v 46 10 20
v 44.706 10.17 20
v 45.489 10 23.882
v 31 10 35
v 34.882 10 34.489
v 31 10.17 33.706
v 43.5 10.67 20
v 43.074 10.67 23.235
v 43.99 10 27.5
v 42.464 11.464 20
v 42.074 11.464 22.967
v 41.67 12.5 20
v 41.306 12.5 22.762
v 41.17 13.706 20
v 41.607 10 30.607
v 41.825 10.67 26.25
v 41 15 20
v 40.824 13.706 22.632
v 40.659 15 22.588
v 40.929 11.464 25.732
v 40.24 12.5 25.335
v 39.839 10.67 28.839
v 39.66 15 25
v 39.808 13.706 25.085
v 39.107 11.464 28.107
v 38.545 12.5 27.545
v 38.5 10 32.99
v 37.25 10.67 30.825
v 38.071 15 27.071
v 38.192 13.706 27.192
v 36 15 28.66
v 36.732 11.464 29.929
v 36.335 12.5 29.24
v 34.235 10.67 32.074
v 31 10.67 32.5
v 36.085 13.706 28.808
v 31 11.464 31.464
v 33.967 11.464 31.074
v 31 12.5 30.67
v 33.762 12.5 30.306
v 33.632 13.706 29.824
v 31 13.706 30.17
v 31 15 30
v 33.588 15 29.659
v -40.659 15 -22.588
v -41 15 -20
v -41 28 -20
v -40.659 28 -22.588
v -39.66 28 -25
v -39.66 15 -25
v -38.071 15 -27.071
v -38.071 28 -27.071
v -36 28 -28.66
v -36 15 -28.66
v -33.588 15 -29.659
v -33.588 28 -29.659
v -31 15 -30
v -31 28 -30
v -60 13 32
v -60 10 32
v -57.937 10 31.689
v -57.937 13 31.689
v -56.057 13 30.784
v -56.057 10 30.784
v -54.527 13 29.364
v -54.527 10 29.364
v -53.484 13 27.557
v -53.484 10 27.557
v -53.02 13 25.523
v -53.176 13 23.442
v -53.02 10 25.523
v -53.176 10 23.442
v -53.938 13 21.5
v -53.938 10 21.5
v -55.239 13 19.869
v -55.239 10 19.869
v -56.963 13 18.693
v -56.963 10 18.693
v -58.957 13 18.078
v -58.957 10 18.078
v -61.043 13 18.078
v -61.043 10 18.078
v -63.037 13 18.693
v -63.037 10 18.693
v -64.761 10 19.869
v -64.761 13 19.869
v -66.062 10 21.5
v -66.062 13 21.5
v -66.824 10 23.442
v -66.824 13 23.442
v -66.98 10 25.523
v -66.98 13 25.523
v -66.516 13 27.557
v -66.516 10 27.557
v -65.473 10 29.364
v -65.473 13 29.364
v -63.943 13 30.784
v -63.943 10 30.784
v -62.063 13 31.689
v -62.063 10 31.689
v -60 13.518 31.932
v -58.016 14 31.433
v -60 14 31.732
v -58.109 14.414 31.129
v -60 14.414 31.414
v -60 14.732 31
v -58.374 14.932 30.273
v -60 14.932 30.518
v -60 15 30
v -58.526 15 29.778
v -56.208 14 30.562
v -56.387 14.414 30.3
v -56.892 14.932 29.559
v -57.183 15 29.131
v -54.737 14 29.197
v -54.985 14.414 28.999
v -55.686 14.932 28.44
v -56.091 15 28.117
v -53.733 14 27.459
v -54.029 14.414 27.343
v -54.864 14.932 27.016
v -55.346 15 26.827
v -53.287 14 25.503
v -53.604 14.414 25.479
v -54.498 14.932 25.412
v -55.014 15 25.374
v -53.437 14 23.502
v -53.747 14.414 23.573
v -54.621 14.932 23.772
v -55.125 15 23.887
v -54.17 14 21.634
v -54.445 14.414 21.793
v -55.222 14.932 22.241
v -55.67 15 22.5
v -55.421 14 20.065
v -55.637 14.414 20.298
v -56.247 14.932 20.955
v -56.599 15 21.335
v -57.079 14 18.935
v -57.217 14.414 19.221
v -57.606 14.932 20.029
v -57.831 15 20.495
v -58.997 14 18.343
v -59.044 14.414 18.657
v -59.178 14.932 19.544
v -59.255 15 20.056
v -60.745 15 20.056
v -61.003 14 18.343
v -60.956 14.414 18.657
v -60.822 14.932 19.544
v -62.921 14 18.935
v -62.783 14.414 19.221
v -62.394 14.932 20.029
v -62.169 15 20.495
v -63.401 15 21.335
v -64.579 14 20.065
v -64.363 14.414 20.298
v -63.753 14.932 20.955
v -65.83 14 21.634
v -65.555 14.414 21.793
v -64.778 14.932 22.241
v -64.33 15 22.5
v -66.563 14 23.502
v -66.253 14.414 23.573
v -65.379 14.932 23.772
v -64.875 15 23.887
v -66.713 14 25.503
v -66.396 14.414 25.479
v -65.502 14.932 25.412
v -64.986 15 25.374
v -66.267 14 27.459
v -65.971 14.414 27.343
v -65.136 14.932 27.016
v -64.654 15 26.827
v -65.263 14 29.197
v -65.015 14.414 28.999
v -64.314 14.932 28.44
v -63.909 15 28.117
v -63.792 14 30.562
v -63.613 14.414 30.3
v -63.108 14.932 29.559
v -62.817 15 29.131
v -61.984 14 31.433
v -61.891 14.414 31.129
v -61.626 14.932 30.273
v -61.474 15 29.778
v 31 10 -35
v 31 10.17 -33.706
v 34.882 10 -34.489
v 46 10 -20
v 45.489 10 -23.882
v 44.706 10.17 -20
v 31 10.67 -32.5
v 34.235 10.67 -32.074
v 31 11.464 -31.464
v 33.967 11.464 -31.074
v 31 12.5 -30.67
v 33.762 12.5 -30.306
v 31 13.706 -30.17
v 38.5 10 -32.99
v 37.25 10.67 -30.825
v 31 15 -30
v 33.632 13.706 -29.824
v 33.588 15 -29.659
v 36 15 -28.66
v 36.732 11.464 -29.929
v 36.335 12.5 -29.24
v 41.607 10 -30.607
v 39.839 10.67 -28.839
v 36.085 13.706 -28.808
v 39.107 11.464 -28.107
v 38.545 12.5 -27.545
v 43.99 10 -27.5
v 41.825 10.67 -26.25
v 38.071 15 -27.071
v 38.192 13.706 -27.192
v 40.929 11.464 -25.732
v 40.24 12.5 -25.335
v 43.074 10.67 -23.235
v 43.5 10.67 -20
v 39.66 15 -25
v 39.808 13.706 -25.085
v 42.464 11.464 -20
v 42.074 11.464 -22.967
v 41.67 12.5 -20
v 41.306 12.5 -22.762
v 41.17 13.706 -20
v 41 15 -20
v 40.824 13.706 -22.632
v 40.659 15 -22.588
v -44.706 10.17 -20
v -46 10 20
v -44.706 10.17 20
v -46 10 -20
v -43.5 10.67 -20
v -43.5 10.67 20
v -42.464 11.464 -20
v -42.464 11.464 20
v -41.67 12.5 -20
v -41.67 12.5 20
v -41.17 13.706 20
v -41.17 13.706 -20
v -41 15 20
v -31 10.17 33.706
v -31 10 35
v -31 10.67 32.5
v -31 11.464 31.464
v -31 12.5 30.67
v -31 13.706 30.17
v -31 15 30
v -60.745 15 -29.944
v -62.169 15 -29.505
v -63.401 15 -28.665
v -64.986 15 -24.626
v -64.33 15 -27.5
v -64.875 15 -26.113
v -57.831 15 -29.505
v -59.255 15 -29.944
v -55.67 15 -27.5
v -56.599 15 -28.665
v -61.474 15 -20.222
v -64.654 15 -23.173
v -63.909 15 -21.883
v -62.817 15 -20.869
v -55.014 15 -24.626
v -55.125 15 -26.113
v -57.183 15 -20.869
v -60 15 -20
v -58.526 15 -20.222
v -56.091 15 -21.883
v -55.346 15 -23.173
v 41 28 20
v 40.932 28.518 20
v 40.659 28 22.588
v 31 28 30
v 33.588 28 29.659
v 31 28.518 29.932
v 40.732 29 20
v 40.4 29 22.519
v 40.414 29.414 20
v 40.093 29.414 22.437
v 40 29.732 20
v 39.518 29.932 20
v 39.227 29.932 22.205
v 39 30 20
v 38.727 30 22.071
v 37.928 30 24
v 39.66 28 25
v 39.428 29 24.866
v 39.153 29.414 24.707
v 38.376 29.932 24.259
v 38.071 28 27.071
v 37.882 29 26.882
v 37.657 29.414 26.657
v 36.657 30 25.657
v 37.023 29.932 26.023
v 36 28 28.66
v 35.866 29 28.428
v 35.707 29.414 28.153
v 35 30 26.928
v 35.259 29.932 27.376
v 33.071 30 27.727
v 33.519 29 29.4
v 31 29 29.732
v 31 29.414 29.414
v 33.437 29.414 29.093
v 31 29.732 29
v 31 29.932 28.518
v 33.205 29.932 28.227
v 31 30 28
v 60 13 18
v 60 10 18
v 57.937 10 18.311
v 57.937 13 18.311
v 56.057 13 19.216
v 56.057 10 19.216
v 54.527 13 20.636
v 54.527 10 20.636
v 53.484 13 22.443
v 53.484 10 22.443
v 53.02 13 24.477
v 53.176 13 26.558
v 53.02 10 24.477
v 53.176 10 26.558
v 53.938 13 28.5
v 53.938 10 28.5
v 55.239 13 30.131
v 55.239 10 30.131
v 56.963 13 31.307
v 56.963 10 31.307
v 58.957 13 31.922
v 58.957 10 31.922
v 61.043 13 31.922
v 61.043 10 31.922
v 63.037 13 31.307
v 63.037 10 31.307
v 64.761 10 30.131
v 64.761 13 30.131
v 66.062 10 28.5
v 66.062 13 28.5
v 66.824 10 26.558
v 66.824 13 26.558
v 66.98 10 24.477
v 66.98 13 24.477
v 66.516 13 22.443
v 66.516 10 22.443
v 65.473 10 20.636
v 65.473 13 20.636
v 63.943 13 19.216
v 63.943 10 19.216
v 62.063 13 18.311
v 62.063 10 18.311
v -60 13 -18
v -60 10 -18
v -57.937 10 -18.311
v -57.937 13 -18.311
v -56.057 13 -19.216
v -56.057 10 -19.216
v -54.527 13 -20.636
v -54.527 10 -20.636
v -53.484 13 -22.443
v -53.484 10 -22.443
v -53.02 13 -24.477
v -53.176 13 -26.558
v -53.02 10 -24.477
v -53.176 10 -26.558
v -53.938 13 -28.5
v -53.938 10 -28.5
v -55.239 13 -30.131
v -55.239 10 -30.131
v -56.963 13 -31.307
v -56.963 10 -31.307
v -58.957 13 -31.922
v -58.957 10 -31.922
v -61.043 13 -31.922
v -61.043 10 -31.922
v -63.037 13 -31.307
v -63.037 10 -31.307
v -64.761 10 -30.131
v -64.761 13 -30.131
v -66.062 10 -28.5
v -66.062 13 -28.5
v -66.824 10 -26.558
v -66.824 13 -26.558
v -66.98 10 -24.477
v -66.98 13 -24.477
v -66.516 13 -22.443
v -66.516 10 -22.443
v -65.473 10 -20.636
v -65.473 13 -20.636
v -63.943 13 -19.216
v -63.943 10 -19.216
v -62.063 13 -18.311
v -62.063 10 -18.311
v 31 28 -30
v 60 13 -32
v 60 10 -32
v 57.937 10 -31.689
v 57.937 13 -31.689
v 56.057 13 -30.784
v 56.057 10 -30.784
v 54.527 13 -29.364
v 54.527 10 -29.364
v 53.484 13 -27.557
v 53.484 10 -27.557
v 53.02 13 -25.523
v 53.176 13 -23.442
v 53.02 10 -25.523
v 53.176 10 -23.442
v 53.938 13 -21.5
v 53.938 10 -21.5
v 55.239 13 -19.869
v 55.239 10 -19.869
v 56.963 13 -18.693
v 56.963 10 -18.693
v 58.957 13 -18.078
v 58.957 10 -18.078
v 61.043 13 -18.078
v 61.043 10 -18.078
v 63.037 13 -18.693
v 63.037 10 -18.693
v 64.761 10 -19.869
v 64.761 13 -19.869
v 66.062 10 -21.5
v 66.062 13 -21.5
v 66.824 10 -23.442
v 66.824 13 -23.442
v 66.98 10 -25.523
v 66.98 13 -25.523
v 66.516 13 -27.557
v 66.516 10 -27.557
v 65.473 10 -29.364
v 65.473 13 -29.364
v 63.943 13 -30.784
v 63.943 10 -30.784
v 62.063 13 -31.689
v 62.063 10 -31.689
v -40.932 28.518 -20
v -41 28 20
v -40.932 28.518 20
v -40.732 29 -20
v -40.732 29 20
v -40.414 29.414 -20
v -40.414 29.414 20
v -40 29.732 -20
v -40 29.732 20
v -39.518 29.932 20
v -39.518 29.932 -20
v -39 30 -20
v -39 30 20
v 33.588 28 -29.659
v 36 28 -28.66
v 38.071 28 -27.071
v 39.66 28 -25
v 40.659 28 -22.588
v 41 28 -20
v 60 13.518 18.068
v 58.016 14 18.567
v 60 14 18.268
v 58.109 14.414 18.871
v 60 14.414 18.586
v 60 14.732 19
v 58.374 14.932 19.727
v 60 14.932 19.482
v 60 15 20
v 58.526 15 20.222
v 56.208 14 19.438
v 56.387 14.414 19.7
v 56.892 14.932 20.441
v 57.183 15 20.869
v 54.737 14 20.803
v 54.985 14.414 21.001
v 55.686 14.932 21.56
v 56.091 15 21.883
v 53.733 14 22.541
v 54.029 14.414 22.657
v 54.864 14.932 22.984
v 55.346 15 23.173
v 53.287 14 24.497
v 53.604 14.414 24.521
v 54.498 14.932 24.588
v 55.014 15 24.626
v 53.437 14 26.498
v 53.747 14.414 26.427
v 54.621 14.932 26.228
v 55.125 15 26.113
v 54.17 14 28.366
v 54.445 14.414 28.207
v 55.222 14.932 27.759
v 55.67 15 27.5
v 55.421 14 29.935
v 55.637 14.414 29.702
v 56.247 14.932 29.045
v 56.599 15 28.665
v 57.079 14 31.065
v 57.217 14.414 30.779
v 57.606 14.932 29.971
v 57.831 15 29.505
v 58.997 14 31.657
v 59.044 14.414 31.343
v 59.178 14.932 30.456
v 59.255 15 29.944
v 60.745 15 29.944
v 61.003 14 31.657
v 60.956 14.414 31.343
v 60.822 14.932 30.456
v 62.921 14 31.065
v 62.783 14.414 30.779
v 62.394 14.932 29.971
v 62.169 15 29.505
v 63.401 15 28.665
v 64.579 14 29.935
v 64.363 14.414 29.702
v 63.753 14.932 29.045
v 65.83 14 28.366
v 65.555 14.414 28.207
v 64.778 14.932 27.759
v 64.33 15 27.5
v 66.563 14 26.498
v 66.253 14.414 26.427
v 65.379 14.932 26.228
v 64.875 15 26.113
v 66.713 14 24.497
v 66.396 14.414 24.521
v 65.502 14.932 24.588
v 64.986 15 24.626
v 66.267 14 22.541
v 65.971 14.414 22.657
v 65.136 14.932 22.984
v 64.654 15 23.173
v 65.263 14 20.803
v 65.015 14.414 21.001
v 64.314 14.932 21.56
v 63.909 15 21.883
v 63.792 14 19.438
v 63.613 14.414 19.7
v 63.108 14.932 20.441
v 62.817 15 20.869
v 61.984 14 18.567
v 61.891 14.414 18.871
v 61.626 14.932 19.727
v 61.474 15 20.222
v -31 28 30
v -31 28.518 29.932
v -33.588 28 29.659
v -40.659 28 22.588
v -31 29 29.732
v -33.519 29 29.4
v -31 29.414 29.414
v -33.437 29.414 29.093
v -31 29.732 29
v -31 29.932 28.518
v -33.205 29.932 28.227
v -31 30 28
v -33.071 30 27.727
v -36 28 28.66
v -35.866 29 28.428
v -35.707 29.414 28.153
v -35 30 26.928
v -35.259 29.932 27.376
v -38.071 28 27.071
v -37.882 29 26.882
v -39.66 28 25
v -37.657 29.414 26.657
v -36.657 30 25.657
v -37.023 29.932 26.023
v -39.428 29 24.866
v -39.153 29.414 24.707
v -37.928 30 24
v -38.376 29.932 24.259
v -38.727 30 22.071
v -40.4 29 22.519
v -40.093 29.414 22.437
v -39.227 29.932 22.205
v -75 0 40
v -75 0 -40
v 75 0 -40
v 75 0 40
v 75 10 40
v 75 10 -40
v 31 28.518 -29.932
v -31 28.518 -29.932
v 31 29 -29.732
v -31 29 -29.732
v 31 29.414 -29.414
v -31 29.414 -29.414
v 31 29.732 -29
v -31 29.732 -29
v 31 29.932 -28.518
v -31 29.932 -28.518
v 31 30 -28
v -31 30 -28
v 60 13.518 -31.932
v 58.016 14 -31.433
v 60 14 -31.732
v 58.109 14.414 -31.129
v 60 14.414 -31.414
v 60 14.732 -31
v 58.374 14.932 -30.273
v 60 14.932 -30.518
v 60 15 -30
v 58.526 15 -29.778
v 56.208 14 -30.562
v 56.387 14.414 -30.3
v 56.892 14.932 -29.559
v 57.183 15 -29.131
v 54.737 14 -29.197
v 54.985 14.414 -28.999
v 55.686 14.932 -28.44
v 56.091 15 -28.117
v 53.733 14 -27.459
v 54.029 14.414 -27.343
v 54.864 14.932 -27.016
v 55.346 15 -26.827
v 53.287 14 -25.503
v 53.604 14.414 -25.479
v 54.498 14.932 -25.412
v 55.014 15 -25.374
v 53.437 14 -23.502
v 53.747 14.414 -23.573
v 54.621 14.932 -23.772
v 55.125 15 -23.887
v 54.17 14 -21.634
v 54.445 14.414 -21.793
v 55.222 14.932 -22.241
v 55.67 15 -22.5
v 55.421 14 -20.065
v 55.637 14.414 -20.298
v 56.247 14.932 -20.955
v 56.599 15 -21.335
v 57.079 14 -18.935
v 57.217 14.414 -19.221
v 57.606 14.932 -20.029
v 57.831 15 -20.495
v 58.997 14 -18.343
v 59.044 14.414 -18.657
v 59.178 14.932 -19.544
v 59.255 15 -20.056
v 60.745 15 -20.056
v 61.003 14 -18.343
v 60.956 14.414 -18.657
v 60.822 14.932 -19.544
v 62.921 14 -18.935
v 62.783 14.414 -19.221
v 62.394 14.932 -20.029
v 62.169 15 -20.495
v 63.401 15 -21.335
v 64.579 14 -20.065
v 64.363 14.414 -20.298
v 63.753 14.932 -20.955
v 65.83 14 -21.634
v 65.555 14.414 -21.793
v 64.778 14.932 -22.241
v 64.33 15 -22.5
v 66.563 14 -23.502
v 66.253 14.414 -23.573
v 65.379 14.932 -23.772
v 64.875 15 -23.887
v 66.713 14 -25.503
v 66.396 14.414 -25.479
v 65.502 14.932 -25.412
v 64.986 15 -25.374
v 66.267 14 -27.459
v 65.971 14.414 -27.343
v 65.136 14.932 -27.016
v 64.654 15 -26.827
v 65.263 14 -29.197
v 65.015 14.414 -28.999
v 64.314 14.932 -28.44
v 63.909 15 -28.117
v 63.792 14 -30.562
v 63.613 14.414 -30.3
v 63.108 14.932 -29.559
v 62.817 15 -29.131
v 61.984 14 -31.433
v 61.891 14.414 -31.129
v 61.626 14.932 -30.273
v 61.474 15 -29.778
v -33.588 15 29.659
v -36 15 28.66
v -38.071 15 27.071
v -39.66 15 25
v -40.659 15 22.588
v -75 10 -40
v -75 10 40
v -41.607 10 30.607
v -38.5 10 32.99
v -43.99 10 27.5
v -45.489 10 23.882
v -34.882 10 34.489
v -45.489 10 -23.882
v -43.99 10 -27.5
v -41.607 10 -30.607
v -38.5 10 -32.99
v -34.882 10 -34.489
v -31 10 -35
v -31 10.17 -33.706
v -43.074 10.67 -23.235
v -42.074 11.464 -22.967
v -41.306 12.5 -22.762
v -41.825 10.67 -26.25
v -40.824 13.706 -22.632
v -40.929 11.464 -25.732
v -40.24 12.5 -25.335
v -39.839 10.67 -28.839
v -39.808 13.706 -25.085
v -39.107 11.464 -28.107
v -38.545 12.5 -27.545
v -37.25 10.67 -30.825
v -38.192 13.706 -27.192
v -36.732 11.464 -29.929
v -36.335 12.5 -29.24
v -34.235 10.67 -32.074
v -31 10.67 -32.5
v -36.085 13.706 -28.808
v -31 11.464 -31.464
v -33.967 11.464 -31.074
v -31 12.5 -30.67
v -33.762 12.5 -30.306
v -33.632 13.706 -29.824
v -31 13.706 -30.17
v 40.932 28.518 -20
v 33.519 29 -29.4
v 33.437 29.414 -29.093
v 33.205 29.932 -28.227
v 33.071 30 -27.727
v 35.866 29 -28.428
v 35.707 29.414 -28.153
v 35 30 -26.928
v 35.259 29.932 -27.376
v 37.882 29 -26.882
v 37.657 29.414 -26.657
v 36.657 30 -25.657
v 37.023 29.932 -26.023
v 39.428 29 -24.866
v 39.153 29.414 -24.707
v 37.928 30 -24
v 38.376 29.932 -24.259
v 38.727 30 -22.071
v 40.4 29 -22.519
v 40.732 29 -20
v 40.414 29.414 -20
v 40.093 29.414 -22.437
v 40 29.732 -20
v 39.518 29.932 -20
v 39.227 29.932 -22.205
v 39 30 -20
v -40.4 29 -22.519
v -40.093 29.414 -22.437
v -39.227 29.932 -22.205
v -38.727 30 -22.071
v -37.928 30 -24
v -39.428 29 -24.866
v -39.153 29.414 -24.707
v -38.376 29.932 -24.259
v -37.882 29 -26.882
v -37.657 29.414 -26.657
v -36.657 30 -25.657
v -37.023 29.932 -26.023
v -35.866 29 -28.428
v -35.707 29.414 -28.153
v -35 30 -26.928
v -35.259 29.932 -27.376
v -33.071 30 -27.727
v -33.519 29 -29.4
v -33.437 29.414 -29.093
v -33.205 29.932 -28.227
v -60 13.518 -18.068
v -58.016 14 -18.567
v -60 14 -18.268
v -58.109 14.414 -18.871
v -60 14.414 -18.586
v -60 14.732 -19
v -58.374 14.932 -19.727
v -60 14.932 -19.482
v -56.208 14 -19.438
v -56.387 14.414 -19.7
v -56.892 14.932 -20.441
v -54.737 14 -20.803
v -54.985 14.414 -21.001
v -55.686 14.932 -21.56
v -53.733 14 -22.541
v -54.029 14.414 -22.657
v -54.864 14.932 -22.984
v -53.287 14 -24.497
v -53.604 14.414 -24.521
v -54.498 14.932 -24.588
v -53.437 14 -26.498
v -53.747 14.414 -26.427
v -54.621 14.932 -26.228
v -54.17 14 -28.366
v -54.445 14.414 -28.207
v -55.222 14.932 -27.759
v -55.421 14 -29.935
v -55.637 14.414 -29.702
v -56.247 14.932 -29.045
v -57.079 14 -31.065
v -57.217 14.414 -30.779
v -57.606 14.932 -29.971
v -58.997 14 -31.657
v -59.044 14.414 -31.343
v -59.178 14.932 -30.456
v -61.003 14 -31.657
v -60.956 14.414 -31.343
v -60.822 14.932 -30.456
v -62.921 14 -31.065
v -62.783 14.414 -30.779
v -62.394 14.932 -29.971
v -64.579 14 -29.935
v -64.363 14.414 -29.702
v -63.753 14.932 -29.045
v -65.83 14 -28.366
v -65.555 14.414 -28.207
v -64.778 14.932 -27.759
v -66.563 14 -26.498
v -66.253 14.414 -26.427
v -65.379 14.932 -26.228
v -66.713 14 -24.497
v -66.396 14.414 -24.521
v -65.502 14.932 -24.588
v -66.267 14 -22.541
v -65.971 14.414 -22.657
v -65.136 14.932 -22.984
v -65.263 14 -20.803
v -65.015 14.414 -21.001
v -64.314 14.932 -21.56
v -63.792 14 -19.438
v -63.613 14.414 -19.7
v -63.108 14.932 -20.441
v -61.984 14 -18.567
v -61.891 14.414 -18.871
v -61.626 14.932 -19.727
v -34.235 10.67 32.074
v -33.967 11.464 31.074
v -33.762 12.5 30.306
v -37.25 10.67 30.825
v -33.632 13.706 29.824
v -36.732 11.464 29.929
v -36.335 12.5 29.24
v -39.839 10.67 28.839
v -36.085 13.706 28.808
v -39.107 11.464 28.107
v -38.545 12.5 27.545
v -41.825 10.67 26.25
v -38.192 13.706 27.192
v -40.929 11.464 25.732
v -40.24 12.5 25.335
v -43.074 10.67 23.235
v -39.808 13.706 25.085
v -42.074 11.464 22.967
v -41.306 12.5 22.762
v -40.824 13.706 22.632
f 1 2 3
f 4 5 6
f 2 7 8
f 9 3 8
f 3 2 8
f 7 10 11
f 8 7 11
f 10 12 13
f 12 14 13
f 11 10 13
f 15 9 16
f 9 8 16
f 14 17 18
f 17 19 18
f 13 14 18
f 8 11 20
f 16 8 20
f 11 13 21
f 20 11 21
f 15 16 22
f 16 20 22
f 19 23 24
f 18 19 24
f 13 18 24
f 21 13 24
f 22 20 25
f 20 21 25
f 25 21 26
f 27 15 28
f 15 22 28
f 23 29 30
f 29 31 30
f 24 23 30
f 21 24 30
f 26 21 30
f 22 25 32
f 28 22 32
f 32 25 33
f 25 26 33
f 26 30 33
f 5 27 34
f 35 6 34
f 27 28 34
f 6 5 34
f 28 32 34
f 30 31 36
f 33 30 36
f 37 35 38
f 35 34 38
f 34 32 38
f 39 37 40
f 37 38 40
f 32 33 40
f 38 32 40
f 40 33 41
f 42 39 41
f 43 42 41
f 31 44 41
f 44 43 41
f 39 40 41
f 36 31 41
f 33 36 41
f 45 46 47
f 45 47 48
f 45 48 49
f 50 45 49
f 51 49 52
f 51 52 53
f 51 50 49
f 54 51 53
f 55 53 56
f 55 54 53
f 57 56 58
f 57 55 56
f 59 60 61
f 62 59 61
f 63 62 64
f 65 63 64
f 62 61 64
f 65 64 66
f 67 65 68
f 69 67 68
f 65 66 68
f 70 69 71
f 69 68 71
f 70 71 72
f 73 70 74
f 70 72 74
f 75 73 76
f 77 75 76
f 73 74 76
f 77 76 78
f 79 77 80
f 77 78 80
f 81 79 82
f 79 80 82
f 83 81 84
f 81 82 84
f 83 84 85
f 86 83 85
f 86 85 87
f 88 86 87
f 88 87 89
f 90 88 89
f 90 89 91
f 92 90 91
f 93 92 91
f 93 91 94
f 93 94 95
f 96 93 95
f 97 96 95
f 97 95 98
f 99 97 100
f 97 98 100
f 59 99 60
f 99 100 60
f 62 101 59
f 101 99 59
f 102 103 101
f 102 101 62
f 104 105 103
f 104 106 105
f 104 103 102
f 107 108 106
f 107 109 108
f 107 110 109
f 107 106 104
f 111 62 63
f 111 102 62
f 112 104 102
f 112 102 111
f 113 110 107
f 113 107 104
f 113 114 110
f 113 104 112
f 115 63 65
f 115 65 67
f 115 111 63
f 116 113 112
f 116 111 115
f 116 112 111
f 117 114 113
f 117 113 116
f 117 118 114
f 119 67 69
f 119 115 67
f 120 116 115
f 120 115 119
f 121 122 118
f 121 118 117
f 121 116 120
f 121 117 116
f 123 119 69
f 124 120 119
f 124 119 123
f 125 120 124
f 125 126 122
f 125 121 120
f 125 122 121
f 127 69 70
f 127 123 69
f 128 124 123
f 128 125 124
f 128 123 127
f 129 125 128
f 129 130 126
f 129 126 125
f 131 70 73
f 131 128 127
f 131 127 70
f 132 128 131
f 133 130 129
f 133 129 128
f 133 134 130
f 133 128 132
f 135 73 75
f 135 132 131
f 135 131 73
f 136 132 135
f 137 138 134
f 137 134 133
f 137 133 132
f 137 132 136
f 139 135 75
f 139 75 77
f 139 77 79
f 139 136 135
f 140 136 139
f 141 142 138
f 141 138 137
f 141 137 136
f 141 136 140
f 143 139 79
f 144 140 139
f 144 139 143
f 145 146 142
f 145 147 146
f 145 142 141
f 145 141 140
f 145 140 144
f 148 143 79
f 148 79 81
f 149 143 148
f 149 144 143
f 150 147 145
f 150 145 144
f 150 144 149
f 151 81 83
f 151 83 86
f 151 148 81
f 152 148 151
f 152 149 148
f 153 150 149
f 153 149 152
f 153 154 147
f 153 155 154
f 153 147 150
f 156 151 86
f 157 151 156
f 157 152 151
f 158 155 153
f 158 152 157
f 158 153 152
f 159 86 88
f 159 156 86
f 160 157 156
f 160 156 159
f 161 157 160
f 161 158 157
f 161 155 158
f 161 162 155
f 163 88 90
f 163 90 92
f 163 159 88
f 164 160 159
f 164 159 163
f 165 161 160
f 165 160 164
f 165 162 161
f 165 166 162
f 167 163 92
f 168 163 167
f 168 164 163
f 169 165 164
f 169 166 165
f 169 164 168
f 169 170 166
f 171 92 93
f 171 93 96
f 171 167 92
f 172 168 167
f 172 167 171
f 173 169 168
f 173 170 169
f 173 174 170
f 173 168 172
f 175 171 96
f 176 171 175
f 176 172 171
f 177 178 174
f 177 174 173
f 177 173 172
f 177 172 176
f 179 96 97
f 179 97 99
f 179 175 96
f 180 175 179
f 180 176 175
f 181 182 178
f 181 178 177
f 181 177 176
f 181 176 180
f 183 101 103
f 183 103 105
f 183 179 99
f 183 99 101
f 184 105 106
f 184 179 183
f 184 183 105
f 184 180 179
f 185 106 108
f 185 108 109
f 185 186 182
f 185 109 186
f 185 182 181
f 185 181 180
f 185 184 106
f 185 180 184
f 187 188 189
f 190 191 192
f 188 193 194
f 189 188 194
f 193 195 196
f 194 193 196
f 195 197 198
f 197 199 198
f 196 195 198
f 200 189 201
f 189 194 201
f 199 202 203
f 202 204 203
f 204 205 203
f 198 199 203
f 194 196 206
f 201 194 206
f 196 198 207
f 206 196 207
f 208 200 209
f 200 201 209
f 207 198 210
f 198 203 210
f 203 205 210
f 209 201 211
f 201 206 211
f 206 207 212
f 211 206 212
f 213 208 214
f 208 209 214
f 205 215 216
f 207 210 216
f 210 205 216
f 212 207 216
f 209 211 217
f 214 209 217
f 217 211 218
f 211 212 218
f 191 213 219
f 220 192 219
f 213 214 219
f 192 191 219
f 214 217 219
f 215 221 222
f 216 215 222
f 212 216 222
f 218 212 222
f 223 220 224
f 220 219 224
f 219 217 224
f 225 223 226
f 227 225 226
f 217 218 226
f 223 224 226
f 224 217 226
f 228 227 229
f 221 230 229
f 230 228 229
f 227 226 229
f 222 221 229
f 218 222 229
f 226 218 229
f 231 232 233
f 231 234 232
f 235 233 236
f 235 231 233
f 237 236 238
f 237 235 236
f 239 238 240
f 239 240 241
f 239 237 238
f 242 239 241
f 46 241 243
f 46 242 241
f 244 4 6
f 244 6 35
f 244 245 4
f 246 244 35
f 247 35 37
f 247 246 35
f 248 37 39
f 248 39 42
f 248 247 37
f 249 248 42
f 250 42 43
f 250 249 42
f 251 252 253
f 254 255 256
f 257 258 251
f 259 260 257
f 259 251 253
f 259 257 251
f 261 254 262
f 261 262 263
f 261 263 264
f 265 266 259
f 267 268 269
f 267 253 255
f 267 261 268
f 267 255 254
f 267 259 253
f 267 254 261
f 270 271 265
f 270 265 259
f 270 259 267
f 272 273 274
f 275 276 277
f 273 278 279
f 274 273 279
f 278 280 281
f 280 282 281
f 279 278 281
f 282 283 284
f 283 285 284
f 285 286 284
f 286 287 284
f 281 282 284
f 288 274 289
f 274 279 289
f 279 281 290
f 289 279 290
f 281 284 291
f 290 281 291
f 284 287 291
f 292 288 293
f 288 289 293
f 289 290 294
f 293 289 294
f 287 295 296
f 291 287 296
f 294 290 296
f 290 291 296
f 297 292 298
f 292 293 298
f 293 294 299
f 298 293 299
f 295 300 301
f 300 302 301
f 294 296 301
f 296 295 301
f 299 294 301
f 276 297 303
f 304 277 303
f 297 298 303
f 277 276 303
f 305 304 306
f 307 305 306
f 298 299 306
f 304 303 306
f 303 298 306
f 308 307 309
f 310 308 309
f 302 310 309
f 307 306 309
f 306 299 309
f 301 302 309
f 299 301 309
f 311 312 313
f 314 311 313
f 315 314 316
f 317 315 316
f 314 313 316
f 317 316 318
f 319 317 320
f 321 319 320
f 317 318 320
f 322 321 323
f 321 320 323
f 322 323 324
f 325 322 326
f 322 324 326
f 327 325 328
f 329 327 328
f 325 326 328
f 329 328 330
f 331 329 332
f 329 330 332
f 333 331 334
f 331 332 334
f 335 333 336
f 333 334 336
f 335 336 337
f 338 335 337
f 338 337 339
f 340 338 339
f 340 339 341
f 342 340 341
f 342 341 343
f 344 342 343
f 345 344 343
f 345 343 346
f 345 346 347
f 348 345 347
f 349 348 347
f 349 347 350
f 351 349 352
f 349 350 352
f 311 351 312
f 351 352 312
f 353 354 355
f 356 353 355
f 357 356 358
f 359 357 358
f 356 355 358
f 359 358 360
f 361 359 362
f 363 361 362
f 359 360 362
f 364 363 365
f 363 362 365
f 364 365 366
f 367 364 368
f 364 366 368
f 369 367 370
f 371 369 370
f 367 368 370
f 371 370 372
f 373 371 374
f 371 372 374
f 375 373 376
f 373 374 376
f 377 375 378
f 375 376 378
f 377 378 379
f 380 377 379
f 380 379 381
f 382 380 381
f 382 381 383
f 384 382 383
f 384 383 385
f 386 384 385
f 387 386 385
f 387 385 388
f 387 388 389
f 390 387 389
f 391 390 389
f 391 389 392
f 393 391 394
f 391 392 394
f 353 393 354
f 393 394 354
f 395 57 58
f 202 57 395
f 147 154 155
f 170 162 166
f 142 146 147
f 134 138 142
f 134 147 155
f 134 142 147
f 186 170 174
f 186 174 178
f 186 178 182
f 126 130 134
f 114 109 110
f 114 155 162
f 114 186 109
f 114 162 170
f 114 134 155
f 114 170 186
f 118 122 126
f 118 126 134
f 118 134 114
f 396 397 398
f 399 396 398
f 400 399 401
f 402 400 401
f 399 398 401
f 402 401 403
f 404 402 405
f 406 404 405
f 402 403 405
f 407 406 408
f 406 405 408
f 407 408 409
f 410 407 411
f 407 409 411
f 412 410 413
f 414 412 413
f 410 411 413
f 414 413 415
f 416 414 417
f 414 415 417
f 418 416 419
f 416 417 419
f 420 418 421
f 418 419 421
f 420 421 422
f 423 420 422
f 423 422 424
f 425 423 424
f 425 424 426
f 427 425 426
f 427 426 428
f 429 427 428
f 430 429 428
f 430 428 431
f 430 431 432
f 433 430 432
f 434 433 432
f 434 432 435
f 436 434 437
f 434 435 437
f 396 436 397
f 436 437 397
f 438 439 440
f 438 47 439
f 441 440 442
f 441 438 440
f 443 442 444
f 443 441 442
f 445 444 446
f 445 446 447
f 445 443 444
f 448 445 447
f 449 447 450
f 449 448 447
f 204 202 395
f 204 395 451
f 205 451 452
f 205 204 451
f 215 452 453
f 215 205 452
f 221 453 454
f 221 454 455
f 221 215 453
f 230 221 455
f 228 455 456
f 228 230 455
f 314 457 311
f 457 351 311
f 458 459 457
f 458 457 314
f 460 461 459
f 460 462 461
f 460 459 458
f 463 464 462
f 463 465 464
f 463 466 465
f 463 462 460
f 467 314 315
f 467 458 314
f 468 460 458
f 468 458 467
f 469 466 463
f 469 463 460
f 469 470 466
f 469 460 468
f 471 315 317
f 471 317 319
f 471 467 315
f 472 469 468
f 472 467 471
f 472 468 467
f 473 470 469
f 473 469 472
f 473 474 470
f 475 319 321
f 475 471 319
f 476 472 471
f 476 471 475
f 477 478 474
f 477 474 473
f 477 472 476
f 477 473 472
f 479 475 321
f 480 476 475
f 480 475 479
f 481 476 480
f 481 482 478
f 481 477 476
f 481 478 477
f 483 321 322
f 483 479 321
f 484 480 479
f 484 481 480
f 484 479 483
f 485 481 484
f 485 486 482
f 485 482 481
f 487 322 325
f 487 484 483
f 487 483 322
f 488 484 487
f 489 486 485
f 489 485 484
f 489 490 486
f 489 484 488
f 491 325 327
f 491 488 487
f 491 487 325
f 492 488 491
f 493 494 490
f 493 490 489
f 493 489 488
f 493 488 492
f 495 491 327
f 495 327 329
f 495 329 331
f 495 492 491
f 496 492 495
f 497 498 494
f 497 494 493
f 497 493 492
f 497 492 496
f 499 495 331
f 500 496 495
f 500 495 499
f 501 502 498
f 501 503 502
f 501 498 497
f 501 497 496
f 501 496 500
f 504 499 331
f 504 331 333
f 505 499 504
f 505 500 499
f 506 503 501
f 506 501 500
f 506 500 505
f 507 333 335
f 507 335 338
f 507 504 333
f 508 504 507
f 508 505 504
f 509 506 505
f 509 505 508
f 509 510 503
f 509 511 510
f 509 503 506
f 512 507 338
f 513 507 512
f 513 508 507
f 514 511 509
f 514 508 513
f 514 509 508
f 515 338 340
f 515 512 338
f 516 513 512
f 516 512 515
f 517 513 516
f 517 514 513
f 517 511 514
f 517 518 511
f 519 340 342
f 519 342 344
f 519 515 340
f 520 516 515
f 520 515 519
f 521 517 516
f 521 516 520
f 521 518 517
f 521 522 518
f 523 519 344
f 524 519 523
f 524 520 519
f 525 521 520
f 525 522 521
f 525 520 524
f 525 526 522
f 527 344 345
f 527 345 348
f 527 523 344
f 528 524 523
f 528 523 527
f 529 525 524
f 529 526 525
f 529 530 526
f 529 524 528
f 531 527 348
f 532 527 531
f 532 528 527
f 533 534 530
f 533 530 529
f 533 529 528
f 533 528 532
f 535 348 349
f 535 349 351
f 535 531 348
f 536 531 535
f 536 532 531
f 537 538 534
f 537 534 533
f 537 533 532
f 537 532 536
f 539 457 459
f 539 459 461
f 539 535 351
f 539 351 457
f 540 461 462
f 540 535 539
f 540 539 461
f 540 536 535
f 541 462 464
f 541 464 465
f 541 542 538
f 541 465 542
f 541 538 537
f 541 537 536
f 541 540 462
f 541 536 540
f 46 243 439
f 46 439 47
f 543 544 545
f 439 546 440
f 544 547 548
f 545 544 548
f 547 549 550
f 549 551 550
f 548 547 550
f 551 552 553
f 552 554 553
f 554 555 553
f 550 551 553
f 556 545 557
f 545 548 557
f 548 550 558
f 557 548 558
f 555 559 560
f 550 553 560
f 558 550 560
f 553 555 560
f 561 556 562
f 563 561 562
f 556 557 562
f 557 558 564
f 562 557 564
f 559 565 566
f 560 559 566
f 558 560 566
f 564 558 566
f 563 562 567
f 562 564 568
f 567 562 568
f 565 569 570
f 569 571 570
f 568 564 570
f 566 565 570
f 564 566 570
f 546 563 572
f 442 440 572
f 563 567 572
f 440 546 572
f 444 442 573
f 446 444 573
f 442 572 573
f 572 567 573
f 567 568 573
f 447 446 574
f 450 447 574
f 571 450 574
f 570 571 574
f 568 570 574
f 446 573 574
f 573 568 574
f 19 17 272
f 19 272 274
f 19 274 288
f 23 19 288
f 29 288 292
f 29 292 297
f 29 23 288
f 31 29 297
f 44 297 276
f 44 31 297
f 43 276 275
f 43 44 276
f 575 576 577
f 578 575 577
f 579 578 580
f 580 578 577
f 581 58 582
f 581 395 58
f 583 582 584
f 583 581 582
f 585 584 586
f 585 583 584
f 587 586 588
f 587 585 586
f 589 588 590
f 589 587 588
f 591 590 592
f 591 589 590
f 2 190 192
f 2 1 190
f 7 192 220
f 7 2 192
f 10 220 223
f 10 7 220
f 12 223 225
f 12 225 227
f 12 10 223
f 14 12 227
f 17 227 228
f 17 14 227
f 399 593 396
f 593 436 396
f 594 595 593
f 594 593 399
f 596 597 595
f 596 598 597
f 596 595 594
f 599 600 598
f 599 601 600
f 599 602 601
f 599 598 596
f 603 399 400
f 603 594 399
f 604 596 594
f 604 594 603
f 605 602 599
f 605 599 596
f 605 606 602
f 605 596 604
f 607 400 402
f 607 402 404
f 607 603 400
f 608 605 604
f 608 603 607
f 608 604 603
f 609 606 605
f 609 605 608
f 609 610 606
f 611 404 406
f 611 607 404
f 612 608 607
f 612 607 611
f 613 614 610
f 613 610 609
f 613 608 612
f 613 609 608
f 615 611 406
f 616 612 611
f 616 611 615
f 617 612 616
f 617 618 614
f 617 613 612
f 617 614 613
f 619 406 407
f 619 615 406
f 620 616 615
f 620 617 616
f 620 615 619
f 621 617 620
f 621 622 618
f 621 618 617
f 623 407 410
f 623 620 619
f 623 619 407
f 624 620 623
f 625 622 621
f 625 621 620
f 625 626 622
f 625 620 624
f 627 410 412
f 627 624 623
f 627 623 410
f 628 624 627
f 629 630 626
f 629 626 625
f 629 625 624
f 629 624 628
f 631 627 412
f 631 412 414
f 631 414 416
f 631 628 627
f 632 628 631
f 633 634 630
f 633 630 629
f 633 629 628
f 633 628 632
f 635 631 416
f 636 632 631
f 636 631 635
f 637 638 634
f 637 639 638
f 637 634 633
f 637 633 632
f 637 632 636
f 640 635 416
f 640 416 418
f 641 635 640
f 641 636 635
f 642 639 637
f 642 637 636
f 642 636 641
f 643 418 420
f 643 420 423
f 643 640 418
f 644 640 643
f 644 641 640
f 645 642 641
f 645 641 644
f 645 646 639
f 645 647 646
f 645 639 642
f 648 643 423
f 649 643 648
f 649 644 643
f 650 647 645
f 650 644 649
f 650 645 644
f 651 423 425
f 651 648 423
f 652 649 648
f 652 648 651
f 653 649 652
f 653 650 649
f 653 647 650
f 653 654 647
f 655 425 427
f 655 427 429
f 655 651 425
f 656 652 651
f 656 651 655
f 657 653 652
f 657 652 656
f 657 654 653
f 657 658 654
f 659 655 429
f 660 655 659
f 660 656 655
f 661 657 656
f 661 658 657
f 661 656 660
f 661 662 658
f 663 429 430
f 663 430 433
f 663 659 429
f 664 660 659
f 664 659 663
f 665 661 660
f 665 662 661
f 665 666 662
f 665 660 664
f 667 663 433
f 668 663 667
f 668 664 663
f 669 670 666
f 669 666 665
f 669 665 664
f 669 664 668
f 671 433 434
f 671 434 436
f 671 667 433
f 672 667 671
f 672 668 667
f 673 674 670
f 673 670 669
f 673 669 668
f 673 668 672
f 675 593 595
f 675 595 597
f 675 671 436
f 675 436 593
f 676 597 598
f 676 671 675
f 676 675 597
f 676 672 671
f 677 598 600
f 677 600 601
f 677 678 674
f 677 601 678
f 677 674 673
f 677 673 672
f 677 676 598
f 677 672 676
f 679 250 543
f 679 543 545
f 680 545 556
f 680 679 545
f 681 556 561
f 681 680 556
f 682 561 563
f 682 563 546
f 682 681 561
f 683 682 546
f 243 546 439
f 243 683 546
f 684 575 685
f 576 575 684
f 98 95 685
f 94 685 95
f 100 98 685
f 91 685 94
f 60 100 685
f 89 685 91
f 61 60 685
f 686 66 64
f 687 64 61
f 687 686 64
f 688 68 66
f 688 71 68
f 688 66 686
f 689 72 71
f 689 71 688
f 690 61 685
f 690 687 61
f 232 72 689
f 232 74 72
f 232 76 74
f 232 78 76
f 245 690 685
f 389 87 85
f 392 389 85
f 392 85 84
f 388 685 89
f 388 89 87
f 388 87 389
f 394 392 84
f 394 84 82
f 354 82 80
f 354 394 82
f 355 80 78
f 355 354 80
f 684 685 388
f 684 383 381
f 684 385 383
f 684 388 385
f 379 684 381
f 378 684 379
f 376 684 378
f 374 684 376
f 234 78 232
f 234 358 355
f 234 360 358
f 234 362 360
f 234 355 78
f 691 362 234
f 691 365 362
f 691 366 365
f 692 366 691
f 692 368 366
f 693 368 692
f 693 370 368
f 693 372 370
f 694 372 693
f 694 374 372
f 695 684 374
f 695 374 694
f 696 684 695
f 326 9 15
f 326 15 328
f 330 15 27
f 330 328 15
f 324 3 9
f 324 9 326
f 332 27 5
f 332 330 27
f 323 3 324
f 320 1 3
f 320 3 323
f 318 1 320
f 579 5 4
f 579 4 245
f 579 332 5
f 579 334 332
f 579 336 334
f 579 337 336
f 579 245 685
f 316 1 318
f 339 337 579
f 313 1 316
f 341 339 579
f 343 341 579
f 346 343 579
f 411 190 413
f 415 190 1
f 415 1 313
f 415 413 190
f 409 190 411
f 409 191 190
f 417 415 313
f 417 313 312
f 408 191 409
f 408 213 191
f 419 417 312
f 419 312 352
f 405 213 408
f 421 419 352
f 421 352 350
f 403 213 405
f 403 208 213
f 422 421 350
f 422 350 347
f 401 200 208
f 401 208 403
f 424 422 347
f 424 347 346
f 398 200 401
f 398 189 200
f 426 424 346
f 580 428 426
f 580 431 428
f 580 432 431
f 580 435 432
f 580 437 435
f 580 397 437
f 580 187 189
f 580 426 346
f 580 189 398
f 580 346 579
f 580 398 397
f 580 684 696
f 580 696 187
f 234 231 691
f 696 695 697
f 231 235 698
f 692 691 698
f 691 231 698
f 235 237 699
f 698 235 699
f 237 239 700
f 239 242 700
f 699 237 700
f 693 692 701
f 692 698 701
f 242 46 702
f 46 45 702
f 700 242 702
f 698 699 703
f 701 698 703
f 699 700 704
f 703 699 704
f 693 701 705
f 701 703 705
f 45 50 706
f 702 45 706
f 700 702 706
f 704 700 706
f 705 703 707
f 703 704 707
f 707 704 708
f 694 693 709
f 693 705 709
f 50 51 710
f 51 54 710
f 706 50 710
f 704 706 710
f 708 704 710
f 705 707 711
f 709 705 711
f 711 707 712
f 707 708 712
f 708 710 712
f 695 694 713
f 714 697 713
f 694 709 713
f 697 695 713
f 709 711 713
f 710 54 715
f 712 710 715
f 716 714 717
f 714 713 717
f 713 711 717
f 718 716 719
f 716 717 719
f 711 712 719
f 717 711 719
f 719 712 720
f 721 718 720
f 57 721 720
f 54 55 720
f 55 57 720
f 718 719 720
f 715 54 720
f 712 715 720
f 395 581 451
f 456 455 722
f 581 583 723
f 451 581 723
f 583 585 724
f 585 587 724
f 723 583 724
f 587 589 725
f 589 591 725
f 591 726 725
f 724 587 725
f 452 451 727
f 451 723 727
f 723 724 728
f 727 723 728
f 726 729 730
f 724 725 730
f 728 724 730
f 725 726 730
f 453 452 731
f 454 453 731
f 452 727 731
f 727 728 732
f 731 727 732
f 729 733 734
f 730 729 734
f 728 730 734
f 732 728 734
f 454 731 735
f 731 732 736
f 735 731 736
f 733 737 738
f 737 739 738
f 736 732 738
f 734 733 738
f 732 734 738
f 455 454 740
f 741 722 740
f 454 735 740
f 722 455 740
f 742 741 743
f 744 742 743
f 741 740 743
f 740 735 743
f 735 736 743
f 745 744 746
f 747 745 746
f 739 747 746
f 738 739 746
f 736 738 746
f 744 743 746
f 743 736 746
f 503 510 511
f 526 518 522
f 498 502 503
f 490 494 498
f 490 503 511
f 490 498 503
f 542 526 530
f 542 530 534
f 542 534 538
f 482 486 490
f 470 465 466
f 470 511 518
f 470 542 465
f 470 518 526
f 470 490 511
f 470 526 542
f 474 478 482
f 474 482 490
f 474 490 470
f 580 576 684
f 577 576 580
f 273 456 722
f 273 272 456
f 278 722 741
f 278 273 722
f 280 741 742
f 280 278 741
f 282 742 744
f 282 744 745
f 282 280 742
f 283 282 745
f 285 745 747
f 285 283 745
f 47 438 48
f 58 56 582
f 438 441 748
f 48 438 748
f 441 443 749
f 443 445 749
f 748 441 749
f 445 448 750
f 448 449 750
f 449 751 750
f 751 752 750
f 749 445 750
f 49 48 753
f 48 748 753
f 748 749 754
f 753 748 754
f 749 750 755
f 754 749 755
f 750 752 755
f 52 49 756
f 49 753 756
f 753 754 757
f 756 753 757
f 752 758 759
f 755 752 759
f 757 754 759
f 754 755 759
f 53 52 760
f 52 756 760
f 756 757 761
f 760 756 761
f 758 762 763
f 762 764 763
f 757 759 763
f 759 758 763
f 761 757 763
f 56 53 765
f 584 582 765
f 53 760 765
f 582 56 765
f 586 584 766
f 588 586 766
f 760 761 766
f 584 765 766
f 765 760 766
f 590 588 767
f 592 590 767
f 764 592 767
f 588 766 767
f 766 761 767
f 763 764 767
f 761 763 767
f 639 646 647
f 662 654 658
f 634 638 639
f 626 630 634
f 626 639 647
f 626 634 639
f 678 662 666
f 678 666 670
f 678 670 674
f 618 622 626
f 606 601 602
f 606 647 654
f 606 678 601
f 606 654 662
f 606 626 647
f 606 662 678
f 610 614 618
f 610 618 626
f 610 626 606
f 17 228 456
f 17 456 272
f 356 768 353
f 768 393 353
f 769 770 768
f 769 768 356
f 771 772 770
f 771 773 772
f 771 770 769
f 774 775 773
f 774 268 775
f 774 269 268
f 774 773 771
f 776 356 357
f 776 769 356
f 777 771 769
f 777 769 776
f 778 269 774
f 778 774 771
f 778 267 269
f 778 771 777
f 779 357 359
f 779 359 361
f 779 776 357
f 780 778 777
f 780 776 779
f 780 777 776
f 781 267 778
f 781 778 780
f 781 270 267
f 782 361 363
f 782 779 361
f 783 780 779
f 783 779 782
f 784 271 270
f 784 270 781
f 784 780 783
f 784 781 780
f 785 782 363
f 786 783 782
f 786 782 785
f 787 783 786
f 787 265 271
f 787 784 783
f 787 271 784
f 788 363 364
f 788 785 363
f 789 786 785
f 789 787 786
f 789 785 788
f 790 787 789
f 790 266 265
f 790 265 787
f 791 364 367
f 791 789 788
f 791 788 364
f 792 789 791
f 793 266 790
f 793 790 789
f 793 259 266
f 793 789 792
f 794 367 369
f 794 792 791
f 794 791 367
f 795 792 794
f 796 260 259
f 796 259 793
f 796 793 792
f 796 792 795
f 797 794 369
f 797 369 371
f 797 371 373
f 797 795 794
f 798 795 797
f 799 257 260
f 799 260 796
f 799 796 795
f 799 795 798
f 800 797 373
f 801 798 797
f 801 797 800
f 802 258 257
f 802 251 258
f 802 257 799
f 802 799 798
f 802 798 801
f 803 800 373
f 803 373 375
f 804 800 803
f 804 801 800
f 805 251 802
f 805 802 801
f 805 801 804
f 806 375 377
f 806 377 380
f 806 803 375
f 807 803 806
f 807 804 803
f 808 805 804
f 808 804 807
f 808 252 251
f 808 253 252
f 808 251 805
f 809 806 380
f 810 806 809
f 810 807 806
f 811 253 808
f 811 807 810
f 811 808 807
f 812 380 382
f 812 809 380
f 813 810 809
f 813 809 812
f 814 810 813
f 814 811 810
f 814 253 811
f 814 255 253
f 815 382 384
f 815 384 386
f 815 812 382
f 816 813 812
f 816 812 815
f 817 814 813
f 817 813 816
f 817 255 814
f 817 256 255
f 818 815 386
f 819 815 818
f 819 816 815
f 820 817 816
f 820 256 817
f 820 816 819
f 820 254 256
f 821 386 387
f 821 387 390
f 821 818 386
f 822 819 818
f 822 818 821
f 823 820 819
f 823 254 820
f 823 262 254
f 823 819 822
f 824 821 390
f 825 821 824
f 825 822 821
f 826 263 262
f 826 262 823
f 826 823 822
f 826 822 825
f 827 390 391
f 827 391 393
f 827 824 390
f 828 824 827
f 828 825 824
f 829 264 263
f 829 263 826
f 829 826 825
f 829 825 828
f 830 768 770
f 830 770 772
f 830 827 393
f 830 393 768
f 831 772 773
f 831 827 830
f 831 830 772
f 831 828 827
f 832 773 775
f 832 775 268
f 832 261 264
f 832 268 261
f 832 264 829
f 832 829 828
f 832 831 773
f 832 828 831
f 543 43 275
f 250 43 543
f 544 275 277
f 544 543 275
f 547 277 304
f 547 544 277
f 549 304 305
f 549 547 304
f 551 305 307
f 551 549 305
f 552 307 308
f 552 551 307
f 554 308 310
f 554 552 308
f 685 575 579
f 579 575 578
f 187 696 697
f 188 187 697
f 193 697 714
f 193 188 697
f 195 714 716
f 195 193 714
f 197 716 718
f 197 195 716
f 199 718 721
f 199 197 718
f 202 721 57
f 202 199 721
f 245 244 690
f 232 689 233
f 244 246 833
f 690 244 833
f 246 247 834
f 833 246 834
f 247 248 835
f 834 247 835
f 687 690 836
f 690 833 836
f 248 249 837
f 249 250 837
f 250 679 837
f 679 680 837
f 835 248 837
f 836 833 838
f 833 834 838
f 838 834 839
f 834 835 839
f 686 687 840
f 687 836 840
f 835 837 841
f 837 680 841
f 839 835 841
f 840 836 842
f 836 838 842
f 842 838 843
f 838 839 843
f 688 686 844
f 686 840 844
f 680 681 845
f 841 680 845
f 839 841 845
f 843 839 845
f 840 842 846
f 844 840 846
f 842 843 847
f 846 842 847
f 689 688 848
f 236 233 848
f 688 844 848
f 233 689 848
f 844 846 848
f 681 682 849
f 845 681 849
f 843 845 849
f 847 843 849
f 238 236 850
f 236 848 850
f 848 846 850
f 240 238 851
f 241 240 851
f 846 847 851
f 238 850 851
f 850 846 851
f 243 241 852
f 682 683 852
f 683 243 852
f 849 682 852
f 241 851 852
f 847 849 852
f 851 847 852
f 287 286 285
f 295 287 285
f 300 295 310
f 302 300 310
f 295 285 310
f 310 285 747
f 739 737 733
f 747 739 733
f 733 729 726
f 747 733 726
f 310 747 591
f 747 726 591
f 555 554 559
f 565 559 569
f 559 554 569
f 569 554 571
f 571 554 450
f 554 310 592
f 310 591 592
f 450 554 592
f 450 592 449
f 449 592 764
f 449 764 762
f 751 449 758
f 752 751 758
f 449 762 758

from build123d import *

# Parameters (mm, degrees)
SKETCH1_W           = 150
SKETCH1_H           = 80
BOSS_EXTRUDE1_DEPTH = 10
SKETCH2_R           = 7
BOSS_EXTRUDE2_DEPTH = 5
FILLET1_R           = 2
BOSS_EXTRUDE3_DEPTH = 20
FILLET2_R           = 2
FILLET3_R           = 5


with BuildPart() as part:
    # Sketch1 → Boss-Extrude1 (new body)
    with BuildSketch(Plane(origin=(0, 0, 0), x_dir=(1, 0, 0), z_dir=(0, 1, 0))):
        Rectangle(SKETCH1_W, SKETCH1_H)
    extrude(amount=BOSS_EXTRUDE1_DEPTH)

    # Sketch2 → Boss-Extrude2 (add)
    with BuildSketch(Plane(origin=(0, 10, 0), x_dir=(1, 0, 0), z_dir=(0, 1, 0))):
        with Locations(Location((-60, 25, 0), (0, 0, 270))):
            Circle(SKETCH2_R)
        with Locations(Location((-60, -25, 0), (0, 0, 270))):
            Circle(SKETCH2_R)
        with Locations(Location((60, -25, 0), (0, 0, 90))):
            Circle(SKETCH2_R)
        with Locations(Location((60, 25, 0), (0, 0, 90))):
            Circle(SKETCH2_R)
    extrude(amount=BOSS_EXTRUDE2_DEPTH)

    # Fillet1
    fillet1_edges = [part.edges().sort_by_distance(p)[0] for p in [
        (-60, 15, -32),
        (-60, 15, 18),
        (60, 15, 32),
        (60, 15, -18),
    ]]
    fillet(fillet1_edges, radius=FILLET1_R)

    # Sketch3 → Boss-Extrude3 (add)
    with BuildSketch(Plane(origin=(0, 10, 0), x_dir=(1, 0, 0), z_dir=(0, 1, 0))):
        with BuildLine():
            Line((-31, 30), (31, 30))
            ThreePointArc((31, 30), (38.071067812, 27.071067812), (41, 20))
            Line((41, 20), (41, -20))
            ThreePointArc((41, -20), (38.071067812, -27.071067812), (31, -30))
            Line((31, -30), (-31, -30))
            ThreePointArc((-31, -30), (-38.071067812, -27.071067812), (-41, -20))
            Line((-41, -20), (-41, 20))
            ThreePointArc((-41, 20), (-38.071067812, 27.071067812), (-31, 30))
        make_face()
    extrude(amount=BOSS_EXTRUDE3_DEPTH)

    # Fillet2
    fillet2_edges = [part.edges().sort_by_distance(p)[0] for p in [
        (-38.071067812, 30, 27.071067812),
        (0, 30, 30),
        (38.071067812, 30, 27.071067812),
        (41, 30, 0),
        (38.071067812, 30, -27.071067812),
        (0, 30, -30),
        (-38.071067812, 30, -27.071067812),
        (-41, 30, 0),
    ]]
    fillet(fillet2_edges, radius=FILLET2_R)

    # Fillet3
    fillet3_edges = [part.edges().sort_by_distance(p)[0] for p in [
        (-38.071067812, 10, 27.071067812),
        (0, 10, 30),
        (38.071067812, 10, 27.071067812),
        (41, 10, 0),
        (38.071067812, 10, -27.071067812),
        (0, 10, -30),
        (-38.071067812, 10, -27.071067812),
        (-41, 10, 0),
    ]]
    fillet(fillet3_edges, radius=FILLET3_R)


solid = part.part
